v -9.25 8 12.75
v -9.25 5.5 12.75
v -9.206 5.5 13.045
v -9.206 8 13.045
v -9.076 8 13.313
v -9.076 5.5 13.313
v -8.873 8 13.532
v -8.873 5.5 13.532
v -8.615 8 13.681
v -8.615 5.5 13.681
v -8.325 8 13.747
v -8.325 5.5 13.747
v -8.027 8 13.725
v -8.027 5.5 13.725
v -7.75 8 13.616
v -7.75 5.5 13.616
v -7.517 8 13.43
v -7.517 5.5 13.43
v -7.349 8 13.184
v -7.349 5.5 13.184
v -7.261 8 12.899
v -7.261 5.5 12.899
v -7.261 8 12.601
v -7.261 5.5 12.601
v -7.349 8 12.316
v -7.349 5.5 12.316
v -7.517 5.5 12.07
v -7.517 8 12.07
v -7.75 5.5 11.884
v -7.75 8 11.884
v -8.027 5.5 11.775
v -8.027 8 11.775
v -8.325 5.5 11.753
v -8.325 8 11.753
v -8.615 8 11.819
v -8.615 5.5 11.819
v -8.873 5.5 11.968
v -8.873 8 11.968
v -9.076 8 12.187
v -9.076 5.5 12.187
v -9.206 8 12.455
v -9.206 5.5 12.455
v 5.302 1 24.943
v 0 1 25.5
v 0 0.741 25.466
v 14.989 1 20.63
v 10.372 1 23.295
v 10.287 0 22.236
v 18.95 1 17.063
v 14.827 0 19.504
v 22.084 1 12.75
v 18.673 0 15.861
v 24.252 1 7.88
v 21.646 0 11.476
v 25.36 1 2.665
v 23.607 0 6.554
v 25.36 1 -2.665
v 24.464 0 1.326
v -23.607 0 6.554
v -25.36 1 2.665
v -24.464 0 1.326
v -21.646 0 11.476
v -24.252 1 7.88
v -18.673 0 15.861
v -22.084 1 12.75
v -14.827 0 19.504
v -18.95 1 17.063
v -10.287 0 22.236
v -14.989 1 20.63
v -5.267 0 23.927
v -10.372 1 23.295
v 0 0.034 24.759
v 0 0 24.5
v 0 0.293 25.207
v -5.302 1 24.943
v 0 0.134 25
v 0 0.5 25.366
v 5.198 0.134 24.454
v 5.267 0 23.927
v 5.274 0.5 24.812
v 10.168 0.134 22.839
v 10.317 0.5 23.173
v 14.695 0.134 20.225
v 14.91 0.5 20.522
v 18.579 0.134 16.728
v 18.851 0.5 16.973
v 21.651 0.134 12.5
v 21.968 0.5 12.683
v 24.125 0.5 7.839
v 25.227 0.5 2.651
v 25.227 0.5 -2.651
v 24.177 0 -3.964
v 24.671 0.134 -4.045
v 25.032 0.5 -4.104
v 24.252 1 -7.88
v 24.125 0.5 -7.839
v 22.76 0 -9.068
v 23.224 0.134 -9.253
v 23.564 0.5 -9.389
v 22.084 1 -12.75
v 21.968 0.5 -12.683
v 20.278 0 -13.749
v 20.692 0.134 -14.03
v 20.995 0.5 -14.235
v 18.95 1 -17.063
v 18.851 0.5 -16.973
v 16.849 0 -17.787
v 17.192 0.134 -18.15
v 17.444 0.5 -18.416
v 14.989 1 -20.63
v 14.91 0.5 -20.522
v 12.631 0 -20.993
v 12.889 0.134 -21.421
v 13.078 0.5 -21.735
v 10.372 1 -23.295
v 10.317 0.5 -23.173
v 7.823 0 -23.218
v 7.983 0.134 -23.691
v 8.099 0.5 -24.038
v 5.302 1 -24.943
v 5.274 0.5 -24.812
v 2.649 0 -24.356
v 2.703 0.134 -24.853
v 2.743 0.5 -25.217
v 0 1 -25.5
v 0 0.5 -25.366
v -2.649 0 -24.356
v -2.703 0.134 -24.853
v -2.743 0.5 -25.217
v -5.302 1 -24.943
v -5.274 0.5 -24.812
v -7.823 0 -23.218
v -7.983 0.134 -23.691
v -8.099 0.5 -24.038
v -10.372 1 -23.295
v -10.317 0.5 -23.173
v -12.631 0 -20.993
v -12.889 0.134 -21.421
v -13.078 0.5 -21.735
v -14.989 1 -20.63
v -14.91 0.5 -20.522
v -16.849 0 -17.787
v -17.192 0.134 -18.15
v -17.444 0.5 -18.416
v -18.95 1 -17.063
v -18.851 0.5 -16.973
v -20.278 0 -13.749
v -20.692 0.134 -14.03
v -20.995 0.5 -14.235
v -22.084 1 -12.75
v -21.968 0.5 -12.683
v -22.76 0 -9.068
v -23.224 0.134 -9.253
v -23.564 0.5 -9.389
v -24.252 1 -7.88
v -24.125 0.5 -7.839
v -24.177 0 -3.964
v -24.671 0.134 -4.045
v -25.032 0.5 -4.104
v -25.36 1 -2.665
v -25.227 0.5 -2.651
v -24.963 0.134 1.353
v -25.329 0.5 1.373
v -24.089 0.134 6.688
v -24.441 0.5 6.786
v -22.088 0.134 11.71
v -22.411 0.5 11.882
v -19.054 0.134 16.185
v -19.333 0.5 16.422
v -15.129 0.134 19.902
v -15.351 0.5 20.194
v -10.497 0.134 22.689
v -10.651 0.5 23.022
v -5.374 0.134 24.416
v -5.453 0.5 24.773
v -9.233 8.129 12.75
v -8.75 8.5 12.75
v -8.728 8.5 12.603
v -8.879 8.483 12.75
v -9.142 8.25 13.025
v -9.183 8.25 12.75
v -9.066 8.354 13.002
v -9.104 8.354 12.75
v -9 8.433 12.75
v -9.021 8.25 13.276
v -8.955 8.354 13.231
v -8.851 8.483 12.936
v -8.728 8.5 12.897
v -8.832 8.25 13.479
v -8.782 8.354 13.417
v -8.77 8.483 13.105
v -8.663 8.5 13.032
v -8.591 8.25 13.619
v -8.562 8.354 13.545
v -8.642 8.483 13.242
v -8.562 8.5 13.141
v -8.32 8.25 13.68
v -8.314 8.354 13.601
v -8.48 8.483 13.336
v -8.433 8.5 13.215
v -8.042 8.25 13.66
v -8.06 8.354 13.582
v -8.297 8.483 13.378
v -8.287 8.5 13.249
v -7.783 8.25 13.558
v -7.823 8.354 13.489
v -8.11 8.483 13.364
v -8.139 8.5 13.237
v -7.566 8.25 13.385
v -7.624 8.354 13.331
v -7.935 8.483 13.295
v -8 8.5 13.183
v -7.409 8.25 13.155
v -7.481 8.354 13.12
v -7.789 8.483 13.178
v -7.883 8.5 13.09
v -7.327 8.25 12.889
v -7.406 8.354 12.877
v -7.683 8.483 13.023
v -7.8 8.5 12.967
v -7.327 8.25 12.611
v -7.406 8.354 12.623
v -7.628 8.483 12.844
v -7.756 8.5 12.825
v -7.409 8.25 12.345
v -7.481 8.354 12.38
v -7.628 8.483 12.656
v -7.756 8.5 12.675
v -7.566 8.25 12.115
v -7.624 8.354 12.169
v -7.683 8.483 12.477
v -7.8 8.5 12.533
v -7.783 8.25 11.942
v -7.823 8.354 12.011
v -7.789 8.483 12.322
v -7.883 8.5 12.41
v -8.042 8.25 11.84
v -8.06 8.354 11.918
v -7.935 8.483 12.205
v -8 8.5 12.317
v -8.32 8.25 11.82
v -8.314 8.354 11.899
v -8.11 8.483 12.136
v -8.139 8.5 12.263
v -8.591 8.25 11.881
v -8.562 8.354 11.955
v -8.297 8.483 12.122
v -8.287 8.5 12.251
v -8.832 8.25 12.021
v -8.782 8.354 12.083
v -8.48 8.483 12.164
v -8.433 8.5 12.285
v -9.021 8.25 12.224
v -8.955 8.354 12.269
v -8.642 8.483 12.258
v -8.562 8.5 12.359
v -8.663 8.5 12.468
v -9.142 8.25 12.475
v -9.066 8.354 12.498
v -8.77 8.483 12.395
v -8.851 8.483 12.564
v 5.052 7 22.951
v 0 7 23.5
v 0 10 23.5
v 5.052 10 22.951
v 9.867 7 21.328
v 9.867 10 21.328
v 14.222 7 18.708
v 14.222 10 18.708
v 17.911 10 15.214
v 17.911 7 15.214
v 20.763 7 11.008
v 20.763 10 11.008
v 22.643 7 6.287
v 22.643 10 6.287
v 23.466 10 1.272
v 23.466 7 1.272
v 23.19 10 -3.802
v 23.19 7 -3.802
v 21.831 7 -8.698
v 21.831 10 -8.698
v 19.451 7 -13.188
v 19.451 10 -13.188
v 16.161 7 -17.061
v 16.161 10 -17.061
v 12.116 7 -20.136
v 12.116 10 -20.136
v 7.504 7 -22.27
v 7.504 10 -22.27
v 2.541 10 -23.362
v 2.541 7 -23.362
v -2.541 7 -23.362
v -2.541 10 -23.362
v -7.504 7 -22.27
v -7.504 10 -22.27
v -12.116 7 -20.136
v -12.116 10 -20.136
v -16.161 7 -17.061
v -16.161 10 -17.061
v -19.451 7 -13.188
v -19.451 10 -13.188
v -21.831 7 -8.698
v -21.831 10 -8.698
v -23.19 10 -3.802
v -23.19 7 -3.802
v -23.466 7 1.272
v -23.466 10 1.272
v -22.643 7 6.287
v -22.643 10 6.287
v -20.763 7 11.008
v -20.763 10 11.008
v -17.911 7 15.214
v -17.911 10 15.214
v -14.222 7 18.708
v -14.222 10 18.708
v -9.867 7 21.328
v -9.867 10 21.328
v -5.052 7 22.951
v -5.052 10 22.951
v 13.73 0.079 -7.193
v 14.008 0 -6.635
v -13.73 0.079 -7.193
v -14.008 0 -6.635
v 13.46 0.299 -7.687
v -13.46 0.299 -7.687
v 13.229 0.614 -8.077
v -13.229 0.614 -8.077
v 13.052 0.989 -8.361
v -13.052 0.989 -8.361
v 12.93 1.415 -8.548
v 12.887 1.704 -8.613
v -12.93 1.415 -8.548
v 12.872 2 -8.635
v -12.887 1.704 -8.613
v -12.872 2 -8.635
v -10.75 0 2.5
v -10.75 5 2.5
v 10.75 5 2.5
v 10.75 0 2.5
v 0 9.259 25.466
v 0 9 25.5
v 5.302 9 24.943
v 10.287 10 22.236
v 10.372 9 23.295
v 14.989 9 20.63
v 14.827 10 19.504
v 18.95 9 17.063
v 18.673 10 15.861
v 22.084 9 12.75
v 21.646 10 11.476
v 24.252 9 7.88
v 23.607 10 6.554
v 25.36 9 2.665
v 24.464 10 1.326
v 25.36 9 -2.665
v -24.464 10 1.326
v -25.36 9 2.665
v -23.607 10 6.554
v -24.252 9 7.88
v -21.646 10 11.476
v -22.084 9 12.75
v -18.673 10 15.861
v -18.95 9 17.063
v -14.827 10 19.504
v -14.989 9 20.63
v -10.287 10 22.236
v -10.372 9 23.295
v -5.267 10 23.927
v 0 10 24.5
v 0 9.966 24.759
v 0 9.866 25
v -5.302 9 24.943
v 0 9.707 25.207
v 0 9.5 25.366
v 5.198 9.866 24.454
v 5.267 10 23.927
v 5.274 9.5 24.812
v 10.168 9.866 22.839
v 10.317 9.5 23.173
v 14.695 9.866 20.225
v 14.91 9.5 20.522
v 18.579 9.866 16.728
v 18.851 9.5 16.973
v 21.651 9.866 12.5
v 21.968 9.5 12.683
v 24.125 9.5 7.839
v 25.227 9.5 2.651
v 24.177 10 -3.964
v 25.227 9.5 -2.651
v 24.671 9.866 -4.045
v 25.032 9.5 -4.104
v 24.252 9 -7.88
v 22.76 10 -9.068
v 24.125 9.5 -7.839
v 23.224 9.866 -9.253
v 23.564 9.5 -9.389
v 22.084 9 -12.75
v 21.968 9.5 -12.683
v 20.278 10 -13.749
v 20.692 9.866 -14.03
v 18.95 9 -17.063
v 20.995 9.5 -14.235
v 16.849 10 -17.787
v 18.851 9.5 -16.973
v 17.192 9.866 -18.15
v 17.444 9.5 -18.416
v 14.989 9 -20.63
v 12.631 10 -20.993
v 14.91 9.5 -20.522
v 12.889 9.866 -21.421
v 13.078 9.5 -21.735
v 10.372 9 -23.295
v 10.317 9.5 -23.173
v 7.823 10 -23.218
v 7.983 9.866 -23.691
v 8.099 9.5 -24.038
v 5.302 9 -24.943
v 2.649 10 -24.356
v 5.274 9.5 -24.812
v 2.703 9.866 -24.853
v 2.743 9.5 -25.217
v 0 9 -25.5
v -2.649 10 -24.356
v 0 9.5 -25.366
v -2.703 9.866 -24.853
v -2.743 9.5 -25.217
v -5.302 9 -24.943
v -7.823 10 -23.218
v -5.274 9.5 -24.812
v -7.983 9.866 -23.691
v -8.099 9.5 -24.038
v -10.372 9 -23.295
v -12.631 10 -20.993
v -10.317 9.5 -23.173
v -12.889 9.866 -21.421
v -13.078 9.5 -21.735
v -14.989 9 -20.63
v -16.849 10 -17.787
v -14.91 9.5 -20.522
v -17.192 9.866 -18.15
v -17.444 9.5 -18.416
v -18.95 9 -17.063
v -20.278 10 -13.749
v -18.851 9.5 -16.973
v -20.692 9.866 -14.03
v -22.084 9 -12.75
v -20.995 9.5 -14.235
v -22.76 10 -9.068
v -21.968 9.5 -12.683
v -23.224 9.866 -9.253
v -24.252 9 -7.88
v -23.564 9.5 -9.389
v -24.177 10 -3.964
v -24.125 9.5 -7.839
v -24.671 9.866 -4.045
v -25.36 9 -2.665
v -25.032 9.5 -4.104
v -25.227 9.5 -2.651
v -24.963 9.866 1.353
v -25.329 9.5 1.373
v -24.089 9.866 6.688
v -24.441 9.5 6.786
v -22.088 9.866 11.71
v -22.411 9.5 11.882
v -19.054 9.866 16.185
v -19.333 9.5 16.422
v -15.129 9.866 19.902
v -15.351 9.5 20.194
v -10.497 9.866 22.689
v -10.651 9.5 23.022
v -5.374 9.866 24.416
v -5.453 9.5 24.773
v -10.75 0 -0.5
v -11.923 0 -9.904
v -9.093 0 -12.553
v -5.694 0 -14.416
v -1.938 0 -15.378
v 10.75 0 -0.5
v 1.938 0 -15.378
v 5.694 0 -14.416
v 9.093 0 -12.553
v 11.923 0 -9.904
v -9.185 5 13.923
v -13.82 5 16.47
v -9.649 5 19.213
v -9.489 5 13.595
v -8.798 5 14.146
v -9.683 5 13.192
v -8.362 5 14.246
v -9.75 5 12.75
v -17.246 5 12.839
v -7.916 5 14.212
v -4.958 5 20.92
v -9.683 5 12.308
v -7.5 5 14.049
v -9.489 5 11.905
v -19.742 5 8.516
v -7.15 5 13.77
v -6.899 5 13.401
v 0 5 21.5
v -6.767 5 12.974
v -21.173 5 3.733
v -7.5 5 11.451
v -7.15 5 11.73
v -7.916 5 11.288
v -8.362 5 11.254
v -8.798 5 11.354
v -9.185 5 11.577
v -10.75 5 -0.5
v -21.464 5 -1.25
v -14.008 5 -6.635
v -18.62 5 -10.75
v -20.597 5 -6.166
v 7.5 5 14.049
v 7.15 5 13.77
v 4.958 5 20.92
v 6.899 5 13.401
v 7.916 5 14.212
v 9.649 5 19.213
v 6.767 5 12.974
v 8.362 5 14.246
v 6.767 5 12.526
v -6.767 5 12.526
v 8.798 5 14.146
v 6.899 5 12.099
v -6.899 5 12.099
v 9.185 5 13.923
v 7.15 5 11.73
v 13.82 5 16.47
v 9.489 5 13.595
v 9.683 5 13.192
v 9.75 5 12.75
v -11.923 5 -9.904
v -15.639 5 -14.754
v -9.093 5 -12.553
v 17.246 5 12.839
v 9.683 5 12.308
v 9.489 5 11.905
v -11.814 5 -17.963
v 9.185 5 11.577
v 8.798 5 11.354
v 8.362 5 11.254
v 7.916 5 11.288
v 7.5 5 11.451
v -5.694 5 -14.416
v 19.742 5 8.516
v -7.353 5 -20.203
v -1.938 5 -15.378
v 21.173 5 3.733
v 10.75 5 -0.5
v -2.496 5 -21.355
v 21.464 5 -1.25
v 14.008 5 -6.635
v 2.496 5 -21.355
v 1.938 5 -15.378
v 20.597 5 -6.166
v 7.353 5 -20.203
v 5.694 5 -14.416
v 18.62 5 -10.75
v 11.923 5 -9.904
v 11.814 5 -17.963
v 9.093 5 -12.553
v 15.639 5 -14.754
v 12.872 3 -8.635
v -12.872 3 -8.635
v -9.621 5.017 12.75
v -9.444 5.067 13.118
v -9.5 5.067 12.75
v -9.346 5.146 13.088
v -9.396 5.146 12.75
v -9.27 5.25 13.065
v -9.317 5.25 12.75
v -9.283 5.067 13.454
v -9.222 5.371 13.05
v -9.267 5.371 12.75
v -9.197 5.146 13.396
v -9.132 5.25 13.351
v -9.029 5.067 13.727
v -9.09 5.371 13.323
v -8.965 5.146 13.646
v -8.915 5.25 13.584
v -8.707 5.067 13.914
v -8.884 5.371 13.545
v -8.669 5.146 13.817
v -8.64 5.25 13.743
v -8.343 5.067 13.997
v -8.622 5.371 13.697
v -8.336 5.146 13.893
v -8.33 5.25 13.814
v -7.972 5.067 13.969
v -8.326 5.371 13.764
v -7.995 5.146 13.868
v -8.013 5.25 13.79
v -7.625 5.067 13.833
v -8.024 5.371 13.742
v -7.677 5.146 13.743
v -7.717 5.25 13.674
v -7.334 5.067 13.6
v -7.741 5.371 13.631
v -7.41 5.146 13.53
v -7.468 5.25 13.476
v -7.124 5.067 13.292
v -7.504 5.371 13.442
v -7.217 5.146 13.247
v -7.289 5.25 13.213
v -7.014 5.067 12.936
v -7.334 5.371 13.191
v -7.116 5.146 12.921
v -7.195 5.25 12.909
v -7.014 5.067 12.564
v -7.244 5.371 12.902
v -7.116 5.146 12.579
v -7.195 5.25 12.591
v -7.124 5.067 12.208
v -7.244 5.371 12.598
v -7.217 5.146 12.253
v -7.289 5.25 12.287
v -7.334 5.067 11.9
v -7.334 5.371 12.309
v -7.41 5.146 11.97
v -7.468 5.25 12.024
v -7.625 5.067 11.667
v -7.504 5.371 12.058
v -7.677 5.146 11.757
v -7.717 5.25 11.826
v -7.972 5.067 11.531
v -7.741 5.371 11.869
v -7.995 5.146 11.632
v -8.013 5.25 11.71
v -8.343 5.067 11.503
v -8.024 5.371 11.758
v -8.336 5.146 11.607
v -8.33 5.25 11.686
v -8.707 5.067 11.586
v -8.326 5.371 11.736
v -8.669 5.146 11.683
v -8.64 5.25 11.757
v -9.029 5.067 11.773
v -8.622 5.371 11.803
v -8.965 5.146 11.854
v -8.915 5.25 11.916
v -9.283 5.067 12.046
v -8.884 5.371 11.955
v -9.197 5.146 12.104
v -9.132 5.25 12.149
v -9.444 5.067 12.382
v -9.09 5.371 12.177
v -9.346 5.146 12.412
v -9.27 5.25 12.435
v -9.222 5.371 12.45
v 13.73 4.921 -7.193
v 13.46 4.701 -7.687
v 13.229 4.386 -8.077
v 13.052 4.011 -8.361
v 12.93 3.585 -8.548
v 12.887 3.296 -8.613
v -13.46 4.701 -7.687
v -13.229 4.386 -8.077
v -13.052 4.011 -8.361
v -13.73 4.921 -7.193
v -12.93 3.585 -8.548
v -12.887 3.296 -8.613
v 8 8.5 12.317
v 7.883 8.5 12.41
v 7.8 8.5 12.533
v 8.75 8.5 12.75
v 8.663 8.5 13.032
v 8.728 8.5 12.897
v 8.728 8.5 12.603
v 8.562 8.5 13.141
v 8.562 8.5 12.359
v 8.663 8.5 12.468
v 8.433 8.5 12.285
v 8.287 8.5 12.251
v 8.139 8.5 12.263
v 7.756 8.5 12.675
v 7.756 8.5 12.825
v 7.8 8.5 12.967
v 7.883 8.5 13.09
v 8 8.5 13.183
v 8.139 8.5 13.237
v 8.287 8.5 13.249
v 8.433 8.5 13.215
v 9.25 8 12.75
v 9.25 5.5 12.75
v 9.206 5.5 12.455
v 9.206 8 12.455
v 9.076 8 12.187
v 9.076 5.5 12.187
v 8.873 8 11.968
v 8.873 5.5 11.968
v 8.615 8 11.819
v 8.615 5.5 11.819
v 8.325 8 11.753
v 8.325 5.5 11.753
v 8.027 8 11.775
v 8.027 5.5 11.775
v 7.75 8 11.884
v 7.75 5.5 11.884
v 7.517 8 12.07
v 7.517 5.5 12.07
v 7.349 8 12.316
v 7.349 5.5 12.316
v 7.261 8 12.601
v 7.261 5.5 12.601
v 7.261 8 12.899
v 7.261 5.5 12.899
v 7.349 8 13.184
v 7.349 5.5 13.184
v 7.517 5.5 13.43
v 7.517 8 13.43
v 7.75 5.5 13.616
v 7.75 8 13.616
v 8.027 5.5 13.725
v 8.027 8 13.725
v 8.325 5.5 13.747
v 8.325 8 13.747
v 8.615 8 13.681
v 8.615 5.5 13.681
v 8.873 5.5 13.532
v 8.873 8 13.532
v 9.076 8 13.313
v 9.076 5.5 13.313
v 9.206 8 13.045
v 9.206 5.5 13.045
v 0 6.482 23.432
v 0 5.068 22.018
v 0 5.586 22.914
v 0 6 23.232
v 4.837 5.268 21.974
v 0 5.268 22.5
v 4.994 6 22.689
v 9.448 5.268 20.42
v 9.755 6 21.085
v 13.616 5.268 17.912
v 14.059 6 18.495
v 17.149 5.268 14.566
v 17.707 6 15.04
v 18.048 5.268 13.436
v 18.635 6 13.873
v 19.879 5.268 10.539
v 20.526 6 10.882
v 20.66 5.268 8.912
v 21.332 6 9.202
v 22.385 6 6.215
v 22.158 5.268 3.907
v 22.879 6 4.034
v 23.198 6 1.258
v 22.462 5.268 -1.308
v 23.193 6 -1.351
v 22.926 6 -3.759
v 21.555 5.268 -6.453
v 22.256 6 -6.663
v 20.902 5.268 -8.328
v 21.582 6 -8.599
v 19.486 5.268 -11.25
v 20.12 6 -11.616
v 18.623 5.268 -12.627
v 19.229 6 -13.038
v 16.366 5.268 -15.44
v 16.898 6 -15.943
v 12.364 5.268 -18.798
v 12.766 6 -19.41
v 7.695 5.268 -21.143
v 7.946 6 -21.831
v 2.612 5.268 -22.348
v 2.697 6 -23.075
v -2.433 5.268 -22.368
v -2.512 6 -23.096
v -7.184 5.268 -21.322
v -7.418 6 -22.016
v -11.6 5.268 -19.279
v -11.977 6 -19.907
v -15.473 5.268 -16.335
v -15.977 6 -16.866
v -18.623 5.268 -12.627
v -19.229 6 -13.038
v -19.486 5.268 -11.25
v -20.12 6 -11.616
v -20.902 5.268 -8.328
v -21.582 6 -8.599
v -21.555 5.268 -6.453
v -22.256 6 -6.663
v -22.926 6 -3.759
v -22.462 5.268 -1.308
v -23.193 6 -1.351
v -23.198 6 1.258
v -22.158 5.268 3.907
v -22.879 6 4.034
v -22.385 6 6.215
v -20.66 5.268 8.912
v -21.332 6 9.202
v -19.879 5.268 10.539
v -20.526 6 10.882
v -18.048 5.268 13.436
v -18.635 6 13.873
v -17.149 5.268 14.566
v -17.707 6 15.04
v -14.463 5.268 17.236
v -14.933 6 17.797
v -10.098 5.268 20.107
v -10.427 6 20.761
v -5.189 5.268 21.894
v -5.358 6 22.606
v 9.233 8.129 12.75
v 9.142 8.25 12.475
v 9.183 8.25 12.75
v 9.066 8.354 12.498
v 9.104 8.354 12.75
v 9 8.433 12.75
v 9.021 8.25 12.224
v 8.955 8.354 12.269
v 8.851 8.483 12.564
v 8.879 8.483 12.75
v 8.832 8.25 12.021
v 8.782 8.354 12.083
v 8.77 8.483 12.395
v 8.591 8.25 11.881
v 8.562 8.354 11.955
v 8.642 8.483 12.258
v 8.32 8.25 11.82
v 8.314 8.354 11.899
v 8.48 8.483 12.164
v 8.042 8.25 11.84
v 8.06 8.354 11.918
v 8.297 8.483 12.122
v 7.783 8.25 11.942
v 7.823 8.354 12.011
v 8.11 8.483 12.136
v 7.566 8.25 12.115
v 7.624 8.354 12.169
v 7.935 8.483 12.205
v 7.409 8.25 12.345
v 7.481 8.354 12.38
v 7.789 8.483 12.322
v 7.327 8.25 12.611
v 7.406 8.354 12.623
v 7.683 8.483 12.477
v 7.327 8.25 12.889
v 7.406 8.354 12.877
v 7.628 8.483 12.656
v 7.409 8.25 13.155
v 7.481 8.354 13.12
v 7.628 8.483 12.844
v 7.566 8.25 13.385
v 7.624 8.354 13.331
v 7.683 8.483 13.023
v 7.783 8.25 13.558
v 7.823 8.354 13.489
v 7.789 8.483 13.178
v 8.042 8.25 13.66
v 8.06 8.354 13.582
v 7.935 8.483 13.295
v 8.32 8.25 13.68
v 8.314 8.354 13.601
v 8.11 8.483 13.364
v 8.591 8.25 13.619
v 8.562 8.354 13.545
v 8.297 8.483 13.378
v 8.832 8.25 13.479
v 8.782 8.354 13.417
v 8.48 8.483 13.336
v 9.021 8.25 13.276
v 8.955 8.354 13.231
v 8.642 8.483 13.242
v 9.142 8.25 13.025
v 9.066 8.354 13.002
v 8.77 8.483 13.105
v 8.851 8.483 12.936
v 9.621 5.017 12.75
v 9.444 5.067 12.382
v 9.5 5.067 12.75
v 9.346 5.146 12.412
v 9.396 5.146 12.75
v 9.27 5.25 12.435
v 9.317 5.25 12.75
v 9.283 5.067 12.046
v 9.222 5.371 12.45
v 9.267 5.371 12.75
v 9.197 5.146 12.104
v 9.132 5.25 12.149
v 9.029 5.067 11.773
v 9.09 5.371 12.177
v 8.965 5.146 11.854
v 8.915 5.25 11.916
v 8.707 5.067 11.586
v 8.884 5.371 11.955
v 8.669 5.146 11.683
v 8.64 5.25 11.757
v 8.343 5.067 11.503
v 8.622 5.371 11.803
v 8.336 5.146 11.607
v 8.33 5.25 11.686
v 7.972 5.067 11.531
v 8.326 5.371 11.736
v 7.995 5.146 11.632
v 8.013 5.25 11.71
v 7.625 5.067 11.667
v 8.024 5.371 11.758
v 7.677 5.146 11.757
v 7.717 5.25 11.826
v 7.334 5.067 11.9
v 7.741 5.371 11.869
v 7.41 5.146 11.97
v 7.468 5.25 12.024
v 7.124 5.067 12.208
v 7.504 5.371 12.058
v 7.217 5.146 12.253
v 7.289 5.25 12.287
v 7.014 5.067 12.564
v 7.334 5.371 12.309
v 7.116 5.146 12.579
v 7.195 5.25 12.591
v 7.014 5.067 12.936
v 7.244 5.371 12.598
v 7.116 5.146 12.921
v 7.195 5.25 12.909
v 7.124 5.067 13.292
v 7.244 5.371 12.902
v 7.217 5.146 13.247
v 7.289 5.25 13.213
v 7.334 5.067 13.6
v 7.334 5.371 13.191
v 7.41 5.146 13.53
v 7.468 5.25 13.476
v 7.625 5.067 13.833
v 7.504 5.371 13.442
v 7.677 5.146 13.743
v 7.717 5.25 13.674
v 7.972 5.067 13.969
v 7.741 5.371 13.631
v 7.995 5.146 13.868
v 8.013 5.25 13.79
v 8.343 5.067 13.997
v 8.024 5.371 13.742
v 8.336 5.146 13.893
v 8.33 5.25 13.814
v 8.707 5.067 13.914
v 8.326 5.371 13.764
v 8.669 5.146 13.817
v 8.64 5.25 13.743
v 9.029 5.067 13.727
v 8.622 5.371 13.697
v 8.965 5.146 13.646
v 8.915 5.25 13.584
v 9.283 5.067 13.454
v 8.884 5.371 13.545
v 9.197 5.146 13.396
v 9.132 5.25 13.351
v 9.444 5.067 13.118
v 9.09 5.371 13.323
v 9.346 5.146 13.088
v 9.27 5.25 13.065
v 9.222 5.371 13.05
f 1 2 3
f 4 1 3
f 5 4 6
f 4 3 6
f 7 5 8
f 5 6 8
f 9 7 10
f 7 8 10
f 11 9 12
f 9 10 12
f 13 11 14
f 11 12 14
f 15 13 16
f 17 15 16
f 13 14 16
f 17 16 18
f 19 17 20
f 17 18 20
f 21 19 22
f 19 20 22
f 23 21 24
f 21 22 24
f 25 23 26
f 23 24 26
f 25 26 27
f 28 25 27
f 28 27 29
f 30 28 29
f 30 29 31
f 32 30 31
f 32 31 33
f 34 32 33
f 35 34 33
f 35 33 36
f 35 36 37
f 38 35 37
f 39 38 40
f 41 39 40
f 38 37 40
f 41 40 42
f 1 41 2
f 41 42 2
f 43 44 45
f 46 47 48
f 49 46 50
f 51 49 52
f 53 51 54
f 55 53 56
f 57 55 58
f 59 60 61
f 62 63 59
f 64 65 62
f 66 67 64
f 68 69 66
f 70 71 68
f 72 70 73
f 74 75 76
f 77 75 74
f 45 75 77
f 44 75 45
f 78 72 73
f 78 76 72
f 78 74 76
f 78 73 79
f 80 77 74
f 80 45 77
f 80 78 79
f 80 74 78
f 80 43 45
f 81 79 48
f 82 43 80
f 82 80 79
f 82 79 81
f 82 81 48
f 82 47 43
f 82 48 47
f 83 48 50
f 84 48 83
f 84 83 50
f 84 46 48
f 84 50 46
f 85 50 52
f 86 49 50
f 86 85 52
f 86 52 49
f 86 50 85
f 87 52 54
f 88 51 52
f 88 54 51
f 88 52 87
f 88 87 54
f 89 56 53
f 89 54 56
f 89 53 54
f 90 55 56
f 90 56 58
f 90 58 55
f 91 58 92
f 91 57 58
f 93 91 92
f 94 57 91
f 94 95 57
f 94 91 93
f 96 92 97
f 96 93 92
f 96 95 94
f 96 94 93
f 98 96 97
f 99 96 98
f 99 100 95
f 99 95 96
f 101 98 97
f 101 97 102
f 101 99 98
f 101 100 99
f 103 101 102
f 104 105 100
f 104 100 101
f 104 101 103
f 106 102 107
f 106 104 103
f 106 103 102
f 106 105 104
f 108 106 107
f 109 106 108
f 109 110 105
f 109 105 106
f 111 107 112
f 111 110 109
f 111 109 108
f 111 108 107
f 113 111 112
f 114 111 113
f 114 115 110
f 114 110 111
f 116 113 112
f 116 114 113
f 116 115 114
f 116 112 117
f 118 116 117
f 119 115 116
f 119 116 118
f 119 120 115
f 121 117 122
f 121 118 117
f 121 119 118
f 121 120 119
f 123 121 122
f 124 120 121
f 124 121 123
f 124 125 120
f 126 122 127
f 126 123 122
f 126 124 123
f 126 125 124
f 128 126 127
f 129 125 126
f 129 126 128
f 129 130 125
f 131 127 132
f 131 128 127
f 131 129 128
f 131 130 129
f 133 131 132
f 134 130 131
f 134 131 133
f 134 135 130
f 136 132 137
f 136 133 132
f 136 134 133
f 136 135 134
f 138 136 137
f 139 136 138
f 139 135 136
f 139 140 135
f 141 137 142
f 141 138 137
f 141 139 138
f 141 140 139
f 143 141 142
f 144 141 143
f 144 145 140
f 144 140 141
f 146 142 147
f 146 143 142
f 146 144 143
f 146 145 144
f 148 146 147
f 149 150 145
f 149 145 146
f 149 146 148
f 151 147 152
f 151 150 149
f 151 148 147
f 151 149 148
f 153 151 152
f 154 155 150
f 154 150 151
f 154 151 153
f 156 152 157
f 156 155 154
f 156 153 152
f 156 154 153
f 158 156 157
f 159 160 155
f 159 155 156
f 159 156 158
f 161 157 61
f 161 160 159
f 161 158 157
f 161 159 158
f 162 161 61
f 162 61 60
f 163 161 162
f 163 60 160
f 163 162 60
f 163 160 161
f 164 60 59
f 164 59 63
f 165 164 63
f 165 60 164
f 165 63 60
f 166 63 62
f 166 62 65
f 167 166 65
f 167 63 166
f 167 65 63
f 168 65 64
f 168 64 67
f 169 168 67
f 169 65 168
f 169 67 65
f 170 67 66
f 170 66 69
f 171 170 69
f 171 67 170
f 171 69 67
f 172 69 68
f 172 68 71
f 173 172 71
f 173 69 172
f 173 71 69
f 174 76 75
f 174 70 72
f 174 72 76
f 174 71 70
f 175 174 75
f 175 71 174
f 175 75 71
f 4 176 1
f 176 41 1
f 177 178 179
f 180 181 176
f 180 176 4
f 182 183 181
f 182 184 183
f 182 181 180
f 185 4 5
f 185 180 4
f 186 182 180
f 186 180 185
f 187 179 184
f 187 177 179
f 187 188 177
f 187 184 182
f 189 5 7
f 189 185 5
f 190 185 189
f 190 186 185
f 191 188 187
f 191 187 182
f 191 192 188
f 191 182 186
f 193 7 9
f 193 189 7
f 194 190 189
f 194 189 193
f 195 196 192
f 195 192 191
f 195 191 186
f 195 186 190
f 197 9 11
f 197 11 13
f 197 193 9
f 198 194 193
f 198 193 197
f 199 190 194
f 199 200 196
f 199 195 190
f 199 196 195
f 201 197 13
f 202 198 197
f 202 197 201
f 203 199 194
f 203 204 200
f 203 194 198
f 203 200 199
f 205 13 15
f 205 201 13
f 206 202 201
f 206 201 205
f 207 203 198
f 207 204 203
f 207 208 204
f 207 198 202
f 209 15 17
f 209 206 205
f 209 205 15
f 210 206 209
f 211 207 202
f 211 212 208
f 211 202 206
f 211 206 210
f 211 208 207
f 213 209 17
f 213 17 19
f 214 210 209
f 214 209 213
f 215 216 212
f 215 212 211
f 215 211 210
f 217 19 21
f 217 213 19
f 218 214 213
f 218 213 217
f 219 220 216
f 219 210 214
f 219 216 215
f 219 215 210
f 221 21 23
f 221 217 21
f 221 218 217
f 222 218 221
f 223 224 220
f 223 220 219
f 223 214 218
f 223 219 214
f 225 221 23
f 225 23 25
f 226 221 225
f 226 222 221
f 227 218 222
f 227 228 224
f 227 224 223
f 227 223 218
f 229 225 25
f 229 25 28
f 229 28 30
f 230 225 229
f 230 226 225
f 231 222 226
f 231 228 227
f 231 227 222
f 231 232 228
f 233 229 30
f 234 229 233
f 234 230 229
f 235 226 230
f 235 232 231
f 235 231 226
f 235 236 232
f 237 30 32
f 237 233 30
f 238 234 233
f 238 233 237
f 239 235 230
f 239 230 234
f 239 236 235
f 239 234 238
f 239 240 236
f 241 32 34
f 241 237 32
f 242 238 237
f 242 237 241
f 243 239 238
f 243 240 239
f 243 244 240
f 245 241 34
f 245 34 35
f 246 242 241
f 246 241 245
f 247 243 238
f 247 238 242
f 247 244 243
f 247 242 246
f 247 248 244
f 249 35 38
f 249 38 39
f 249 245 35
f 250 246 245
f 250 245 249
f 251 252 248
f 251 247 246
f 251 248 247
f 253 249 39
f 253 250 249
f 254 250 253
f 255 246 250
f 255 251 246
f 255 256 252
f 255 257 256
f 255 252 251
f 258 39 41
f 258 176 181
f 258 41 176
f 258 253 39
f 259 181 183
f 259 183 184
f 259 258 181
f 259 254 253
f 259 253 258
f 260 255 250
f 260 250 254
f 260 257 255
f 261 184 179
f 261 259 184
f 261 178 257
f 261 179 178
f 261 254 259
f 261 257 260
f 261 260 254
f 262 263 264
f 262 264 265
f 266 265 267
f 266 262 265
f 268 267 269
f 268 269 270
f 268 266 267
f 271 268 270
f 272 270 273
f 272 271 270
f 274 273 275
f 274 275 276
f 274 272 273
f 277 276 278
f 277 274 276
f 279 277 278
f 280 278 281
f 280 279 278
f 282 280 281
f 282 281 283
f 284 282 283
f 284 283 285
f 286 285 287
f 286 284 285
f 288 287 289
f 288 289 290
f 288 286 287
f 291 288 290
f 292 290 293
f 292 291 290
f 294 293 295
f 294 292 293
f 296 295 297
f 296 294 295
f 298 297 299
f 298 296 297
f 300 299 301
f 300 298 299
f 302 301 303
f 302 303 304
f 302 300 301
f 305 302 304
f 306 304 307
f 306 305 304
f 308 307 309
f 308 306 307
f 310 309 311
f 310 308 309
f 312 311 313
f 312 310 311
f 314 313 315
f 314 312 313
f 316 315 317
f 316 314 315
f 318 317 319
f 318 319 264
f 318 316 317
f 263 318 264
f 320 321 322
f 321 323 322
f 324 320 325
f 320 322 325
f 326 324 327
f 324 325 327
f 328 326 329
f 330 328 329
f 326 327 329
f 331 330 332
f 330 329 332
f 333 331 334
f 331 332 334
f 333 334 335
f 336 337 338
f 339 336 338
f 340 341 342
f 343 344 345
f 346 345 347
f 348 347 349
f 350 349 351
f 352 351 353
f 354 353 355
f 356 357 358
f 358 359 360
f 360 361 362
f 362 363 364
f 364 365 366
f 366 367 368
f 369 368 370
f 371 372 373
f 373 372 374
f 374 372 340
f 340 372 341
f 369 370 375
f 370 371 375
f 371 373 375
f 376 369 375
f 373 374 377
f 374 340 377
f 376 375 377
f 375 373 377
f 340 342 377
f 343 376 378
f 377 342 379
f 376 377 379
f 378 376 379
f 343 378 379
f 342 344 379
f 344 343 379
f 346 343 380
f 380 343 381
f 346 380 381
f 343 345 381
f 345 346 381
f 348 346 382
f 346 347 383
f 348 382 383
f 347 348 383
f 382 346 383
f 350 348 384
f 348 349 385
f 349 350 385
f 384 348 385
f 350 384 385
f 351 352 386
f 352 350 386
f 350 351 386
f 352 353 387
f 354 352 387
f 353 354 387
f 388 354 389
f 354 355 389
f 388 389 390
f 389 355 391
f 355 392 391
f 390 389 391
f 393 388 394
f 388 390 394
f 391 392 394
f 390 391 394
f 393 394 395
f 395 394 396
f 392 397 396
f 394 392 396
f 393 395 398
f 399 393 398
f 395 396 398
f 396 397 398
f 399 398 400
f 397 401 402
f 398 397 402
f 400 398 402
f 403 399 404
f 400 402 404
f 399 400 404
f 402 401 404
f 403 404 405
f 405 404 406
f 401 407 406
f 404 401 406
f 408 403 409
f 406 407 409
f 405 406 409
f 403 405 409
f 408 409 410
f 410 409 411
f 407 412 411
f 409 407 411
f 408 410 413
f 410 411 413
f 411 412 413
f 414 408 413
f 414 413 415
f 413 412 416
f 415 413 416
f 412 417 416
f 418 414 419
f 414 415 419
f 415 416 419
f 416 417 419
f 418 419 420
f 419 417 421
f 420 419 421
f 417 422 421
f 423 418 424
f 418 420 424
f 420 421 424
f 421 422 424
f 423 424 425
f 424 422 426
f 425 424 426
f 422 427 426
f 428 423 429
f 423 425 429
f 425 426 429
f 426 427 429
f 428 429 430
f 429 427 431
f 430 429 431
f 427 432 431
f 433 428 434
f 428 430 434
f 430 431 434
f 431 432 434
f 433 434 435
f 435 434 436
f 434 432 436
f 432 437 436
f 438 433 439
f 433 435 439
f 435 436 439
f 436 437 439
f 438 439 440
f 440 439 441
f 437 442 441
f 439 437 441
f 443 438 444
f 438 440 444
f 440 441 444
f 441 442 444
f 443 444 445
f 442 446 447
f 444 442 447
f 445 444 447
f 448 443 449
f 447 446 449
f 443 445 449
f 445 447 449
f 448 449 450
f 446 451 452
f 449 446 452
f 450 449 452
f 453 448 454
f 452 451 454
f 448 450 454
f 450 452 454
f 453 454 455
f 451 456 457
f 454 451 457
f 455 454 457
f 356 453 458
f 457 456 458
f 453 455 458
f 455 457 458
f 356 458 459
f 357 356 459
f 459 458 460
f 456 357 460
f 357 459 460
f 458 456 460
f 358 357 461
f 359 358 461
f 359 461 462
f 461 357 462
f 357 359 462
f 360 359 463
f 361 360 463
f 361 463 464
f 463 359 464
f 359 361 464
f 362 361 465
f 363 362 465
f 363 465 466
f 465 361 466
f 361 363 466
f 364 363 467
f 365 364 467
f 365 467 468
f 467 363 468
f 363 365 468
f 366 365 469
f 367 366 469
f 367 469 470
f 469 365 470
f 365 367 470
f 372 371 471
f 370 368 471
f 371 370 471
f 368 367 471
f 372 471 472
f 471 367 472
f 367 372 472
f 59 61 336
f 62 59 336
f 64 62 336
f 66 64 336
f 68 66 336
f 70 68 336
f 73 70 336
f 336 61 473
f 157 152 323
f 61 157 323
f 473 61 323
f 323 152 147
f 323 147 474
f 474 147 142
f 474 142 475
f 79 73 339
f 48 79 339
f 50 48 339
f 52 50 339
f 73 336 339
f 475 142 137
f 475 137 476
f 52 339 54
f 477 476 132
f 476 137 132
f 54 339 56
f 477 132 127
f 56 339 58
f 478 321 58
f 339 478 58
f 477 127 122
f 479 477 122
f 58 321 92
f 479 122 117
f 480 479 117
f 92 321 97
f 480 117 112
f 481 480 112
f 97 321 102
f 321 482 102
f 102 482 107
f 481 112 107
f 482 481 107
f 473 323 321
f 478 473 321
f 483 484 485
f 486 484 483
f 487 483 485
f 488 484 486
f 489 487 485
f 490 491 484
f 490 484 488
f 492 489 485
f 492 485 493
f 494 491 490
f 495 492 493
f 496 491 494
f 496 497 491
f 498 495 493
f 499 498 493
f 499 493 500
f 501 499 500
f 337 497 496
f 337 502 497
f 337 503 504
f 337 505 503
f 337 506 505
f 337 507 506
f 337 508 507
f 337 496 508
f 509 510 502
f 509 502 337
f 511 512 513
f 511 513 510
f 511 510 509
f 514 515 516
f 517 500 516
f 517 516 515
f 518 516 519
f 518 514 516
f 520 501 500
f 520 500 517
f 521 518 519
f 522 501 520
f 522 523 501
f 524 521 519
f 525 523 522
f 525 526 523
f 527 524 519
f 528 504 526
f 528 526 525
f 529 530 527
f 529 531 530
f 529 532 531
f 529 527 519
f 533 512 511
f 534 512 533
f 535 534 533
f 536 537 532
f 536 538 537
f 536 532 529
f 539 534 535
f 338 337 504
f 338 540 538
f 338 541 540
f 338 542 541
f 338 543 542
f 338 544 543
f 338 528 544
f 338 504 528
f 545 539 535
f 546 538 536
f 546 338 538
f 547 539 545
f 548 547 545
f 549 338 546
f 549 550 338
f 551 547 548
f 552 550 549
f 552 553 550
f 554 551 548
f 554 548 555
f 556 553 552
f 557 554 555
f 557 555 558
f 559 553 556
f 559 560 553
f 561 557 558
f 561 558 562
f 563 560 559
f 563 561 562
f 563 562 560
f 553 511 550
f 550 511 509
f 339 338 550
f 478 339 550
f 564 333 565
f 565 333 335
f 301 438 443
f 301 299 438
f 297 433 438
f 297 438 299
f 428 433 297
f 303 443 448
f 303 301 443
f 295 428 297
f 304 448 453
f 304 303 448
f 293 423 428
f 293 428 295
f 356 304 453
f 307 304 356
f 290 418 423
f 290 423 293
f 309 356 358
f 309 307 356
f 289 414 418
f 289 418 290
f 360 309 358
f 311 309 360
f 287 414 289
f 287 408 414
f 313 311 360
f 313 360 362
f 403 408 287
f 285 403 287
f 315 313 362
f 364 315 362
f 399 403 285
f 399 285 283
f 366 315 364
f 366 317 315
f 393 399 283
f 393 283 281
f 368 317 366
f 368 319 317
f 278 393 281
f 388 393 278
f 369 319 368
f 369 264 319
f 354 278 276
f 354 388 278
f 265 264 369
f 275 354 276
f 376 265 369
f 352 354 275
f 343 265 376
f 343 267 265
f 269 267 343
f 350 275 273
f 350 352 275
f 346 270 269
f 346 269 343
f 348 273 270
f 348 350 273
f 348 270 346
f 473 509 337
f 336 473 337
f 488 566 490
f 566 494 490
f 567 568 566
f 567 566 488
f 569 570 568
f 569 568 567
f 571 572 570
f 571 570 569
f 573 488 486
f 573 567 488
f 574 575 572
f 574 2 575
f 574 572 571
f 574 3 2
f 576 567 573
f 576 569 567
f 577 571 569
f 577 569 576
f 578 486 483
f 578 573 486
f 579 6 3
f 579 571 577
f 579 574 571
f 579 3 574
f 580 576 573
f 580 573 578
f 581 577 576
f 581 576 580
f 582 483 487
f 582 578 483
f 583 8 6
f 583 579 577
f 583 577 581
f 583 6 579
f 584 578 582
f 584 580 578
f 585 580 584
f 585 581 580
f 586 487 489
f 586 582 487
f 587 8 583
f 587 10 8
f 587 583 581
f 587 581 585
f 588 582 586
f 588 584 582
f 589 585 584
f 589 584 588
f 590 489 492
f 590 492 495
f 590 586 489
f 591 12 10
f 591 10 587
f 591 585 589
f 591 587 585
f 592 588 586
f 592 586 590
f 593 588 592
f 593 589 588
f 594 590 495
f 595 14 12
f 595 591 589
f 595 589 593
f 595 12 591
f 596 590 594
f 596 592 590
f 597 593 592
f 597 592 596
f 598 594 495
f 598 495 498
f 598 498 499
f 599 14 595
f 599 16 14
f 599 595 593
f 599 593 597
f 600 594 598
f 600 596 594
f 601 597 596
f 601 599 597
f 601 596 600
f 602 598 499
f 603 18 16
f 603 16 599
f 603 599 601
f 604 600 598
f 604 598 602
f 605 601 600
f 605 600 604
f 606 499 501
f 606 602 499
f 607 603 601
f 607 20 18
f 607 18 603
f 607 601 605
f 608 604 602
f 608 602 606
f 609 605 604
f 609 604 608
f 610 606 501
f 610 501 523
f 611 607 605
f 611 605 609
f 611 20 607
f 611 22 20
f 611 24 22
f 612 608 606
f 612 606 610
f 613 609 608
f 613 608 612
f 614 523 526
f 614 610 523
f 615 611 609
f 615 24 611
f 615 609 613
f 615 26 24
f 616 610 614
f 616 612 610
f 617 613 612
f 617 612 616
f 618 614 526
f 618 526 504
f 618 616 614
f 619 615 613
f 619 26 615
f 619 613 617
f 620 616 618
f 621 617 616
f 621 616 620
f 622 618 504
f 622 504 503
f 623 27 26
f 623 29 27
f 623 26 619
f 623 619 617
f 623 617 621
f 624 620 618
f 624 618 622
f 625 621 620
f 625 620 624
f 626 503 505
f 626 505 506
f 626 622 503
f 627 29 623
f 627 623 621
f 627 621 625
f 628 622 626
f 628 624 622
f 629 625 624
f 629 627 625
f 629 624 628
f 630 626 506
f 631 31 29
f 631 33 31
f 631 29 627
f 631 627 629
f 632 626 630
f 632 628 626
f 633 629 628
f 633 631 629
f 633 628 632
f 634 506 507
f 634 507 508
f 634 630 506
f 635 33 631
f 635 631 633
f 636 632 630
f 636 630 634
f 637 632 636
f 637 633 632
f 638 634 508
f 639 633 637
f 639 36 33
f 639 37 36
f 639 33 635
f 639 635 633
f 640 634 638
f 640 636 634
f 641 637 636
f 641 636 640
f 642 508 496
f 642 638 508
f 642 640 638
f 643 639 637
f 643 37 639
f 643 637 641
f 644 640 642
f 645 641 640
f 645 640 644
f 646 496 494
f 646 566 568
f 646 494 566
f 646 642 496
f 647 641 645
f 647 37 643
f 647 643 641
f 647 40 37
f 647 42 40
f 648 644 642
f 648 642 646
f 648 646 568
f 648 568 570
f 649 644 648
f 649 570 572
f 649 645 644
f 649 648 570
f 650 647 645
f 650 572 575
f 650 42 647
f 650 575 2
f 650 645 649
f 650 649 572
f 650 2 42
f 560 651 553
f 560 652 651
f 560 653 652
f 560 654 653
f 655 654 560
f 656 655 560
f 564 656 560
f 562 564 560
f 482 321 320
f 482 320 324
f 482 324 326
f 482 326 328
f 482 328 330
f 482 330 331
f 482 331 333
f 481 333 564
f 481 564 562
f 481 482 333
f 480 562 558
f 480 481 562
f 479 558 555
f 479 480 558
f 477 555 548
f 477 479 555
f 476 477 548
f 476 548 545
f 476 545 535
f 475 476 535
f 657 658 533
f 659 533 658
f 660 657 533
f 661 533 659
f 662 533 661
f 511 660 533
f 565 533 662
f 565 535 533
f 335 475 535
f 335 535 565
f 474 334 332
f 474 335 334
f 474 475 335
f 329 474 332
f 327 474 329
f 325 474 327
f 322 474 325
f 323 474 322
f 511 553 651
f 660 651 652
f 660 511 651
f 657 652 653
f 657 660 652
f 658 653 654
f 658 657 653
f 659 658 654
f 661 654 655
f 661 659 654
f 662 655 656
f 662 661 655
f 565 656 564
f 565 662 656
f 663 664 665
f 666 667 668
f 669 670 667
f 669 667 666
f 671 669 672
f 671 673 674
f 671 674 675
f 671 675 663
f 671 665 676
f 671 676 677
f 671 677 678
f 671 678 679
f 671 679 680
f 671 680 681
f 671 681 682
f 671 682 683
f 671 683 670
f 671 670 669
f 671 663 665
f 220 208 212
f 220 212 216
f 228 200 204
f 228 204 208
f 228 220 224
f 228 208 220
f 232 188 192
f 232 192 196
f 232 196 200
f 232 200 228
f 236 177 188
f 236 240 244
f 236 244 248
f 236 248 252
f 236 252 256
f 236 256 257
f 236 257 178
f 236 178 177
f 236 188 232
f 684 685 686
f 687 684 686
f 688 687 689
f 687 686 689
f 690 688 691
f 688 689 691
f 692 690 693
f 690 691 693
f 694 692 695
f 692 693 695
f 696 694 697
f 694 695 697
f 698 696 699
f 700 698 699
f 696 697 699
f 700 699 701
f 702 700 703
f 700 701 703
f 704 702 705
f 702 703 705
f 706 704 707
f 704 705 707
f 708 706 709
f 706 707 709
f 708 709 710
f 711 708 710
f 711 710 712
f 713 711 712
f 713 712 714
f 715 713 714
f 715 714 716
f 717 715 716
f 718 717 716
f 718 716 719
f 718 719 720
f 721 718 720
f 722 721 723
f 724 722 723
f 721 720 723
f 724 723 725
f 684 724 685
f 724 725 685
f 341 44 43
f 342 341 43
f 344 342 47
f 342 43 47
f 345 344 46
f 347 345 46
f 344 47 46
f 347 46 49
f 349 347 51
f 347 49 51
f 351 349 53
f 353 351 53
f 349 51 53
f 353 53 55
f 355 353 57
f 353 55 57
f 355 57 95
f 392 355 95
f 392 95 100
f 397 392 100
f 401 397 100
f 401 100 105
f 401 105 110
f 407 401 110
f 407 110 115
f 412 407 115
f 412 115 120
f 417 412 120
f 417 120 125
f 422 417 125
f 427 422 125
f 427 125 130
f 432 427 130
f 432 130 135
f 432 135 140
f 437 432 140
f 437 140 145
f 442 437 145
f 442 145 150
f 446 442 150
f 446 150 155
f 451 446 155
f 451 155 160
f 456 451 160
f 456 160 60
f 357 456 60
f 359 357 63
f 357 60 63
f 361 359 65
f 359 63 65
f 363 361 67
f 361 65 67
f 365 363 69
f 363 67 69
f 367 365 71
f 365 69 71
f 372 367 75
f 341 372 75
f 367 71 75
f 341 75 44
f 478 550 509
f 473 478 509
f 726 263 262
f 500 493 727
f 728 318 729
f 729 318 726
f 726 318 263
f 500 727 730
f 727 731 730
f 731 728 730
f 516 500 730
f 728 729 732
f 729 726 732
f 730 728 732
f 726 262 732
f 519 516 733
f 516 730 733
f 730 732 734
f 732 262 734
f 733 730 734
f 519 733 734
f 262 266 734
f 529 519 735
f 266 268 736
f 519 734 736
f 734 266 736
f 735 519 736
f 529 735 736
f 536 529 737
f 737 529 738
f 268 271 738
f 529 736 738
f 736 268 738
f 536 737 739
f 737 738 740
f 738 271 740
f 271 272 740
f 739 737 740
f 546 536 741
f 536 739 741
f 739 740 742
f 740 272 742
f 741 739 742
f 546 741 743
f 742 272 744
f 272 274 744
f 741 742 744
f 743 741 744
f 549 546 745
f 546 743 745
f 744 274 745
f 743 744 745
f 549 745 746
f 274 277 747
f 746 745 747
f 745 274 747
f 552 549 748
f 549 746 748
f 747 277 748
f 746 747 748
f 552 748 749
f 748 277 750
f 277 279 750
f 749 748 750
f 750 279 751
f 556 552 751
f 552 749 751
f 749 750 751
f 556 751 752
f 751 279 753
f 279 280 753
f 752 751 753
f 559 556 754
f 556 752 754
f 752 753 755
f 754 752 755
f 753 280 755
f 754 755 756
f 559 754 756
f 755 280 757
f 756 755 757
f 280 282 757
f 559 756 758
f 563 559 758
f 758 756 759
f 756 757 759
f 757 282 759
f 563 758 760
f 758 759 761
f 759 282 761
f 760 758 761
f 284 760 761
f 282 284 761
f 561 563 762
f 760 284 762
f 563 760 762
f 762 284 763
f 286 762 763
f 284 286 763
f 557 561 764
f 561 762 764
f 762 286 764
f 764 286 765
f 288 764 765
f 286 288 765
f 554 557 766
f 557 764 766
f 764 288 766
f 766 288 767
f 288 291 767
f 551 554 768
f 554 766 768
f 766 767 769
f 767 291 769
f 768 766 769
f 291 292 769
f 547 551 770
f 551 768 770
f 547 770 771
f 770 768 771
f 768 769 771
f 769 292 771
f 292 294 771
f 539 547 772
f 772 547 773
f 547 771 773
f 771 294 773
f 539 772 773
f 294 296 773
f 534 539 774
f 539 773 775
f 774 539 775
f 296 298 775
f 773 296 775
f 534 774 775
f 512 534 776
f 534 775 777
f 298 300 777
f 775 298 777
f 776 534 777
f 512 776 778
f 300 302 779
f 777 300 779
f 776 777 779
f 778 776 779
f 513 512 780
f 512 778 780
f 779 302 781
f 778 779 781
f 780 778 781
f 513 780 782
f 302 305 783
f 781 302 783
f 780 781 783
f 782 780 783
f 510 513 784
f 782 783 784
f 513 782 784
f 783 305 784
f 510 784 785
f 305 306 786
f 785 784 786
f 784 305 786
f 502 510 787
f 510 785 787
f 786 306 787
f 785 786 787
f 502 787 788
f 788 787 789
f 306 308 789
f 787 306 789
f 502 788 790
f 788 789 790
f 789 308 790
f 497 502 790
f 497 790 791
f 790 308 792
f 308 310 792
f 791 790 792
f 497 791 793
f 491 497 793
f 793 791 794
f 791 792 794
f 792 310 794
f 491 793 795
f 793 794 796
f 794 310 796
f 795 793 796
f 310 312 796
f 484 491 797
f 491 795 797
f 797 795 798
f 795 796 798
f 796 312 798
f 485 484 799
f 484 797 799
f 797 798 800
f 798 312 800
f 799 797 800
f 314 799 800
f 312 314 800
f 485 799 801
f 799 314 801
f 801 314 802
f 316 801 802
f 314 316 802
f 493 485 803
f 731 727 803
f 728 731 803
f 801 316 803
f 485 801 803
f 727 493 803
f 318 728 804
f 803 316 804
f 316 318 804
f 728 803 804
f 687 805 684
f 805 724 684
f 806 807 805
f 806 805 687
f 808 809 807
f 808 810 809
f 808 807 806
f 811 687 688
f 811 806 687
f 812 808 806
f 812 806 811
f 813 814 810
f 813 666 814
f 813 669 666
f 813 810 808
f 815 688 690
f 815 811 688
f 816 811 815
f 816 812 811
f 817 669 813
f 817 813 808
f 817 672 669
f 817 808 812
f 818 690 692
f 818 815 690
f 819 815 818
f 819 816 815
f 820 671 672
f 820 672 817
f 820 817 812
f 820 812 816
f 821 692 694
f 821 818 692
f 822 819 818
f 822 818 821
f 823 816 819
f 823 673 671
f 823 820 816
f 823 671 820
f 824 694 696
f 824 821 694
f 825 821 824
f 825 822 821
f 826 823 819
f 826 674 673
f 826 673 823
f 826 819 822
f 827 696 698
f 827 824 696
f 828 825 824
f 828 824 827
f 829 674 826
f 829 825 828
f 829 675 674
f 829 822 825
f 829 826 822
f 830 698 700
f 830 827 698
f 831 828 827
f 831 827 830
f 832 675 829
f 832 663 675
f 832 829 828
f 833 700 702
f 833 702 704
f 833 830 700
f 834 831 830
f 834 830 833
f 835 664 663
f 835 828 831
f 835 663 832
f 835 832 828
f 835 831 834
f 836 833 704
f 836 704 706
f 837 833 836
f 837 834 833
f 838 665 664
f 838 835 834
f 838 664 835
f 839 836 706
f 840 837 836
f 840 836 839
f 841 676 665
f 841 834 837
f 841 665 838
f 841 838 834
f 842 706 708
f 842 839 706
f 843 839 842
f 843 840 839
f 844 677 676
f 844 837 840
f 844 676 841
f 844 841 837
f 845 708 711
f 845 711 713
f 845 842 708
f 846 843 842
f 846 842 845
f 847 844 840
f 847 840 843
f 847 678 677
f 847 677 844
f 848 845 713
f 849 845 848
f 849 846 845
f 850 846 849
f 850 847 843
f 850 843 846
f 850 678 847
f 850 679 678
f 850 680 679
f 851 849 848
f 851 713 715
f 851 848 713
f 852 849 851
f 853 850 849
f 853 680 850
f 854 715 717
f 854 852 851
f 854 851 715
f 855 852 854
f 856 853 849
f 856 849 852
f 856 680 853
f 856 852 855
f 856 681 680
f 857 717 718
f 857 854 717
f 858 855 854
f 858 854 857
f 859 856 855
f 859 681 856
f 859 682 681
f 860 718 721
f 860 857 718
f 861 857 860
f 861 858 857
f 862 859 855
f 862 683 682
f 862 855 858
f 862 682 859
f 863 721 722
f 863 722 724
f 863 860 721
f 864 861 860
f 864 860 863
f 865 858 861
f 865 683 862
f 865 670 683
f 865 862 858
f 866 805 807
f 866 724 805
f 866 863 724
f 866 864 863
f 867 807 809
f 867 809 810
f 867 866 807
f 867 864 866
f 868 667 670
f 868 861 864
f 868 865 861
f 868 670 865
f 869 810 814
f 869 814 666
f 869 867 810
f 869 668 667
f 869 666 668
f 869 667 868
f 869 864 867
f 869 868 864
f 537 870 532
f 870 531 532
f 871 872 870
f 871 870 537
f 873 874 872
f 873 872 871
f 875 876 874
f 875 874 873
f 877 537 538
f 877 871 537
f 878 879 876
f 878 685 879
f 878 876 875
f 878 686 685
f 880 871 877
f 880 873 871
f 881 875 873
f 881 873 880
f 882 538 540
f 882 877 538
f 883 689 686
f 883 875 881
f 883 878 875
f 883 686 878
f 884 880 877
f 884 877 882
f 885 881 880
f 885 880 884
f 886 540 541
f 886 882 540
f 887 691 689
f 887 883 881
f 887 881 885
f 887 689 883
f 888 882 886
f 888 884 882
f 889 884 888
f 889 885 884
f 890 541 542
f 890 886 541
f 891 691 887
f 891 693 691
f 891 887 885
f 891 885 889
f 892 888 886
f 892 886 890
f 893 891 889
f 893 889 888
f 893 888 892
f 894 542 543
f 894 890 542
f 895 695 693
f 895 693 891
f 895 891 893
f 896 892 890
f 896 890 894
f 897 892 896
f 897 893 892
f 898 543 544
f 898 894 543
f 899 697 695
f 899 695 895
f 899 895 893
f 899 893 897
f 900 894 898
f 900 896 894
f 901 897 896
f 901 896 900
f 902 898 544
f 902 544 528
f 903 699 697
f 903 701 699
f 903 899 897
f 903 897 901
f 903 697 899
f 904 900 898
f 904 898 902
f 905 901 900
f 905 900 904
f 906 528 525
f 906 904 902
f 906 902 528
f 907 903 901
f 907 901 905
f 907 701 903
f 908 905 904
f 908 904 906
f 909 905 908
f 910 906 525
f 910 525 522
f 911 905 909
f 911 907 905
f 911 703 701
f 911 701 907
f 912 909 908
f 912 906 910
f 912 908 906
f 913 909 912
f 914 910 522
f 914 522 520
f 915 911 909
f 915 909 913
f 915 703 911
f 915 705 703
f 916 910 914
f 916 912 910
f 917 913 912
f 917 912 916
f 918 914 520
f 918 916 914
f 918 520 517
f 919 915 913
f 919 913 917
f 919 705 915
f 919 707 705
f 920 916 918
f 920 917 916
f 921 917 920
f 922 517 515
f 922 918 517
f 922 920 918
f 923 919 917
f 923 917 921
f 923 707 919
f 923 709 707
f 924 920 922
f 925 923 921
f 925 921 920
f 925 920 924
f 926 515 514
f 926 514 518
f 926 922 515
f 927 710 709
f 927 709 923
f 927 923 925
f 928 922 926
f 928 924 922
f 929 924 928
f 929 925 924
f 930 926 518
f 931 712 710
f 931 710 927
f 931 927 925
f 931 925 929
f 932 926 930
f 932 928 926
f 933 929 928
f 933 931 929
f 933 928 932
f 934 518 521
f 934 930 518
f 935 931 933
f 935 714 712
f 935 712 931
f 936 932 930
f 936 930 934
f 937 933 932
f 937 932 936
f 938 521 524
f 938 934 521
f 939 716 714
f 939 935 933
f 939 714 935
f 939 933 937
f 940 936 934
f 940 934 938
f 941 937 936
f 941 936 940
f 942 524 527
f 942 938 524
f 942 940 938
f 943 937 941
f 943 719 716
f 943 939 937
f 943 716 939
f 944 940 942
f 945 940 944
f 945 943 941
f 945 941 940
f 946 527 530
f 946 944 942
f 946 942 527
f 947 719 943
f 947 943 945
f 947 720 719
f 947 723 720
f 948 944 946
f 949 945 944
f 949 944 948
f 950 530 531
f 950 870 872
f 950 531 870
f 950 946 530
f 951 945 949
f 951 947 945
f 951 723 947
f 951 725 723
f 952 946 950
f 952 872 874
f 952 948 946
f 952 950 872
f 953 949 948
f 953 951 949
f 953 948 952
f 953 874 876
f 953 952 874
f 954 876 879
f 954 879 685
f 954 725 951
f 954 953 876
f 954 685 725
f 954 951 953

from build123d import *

# Parameters (mm, degrees)
SKETCH1_R           = 25.500000000000004
SKETCH1_R_2         = 15.5
BOSS_EXTRUDE1_DEPTH = 5
SKETCH2_R           = 25.5
SKETCH2_R_2         = 23.500000000000004
BOSS_EXTRUDE2_DEPTH = 5
FILLET1_R           = 2
CUT_EXTRUDE1_DEPTH  = 5
BOSS_EXTRUDE3_DEPTH = 3.5
FILLET2_R           = 0.5
FILLET3_R           = 1


with BuildPart() as part:
    # Sketch1 → Boss-Extrude1 (new body)
    # profile 1 of 2: a face of its own
    with BuildSketch(Plane(origin=(0, 0, 0), x_dir=(1, 0, 0), z_dir=(0, 1, 0))):
        with Locations(Location((0, 0, 0), (0, 0, 270))):
            Circle(SKETCH1_R)
        Circle(SKETCH1_R_2, mode=Mode.SUBTRACT)
    # profile 2 of 2: a face of its own
    with BuildSketch(Plane(origin=(0, 0, 0), x_dir=(1, 0, 0), z_dir=(0, 1, 0))):
        with BuildLine():
            Line((12.871816372215148, 8.635180558620302), (-12.871816372215148, 8.635180558620302))
            ThreePointArc((-12.871816372215148, 8.635180558620304), (-4.51313894261329, -14.828404394427182), (15.5, -3.8e-15))
            ThreePointArc((15.5, 0), (14.828404394427182, 4.513138942613289), (12.871816372215148, 8.635180558620304))
        make_face()
    extrude(amount=BOSS_EXTRUDE1_DEPTH)

    # Sketch2 → Boss-Extrude2 (add)
    with BuildSketch(Plane(origin=(0, 5, 0), x_dir=(1, 0, 0), z_dir=(0, 1, 0))):
        with Locations(Location((0, 0, 0), (0, 0, 270))):
            Circle(SKETCH2_R)
        with Locations(Location((0, 0, 0), (0, 0, 270))):
            Circle(SKETCH2_R_2, mode=Mode.SUBTRACT)
    extrude(amount=BOSS_EXTRUDE2_DEPTH)

    # Fillet1
    fillet1_edges = [part.edges().sort_by_distance(p)[0] for p in [
        (1.763e-14, 5, -23.500000000000004),
        (0, 0, -8.635180558620302),
        (0, 5, -8.635180558620302),
    ]]
    fillet(fillet1_edges, radius=FILLET1_R)

    # Sketch3 → Cut-Extrude1 (cut)
    with BuildSketch(Plane(origin=(0, 5, 0), x_dir=(1, 0, 0), z_dir=(0, 1, 0))):
        Polygon((-10.75, -2.5000000000000018), (10.75, -2.499999999999999), (10.75, 0.5000000000000018), (-10.75, 0.4999999999999983), align=None)
    extrude(amount=-CUT_EXTRUDE1_DEPTH, mode=Mode.SUBTRACT)

    # Sketch5 → Boss-Extrude3 (add)
    with BuildSketch(Plane(origin=(0, 5, 0), x_dir=(1, 0, 0), z_dir=(0, 1, 0))):
        with BuildLine():
            ThreePointArc((8.250000000000018, -13.750000000000004), (8.957106781186555, -13.457106781186544), (9.250000000000002, -12.750000000000002))
            Line((9.250000000000002, -12.750000000000002), (8.25, -12.750000000000002))
            Line((8.25, -12.750000000000002), (8.25, -13.750000000000004))
        make_face()
        with BuildLine():
            Line((8.25, -12.750000000000002), (9.250000000000002, -12.750000000000002))
            ThreePointArc((9.250000000000002, -12.750000000000002), (7.542893218813445, -12.04289321881346), (8.250000000000018, -13.750000000000004))
            Line((8.25, -13.750000000000004), (8.25, -12.750000000000002))
        make_face()
        with BuildLine():
            ThreePointArc((-7.2499999999999964, -12.750000000000002), (-8.249999999999996, -11.750000000000002), (-9.249999999999996, -12.750000000000002))
            Line((-9.249999999999996, -12.750000000000002), (-8.249999999999996, -12.750000000000002))
            Line((-8.249999999999996, -12.750000000000002), (-8.249999999999996, -13.750000000000002))
            ThreePointArc((-8.249999999999979, -13.750000000000002), (-7.542893218813443, -13.457106781186543), (-7.2499999999999964, -12.750000000000002))
        make_face()
        with BuildLine():
            Line((-8.249999999999996, -12.750000000000002), (-9.249999999999996, -12.750000000000002))
            ThreePointArc((-9.249999999999996, -12.750000000000002), (-8.957106781186537, -13.457106781186555), (-8.249999999999979, -13.750000000000002))
            Line((-8.249999999999996, -13.750000000000002), (-8.249999999999996, -12.750000000000002))
        make_face()
    extrude(amount=BOSS_EXTRUDE3_DEPTH)

    # Fillet2
    fillet2_edges = [part.edges().sort_by_distance(p)[0] for p in [
        (8.249999999999986, 5, 11.750000000000002),
        (8.249999999999982, 8.5, 11.749999999999998),
        (-7.249999999999996, 5, 12.749999999999998),
        (-7.2499999999999964, 8.5, 12.750000000000002),
    ]]
    fillet(fillet2_edges, radius=FILLET2_R)

    # Fillet3
    fillet3_edges = [part.edges().sort_by_distance(p)[0] for p in [
        (7.81e-15, 10, -25.5),
        (7.81e-15, 0, -25.500000000000004),
    ]]
    fillet(fillet3_edges, radius=FILLET3_R)


solid = part.part
